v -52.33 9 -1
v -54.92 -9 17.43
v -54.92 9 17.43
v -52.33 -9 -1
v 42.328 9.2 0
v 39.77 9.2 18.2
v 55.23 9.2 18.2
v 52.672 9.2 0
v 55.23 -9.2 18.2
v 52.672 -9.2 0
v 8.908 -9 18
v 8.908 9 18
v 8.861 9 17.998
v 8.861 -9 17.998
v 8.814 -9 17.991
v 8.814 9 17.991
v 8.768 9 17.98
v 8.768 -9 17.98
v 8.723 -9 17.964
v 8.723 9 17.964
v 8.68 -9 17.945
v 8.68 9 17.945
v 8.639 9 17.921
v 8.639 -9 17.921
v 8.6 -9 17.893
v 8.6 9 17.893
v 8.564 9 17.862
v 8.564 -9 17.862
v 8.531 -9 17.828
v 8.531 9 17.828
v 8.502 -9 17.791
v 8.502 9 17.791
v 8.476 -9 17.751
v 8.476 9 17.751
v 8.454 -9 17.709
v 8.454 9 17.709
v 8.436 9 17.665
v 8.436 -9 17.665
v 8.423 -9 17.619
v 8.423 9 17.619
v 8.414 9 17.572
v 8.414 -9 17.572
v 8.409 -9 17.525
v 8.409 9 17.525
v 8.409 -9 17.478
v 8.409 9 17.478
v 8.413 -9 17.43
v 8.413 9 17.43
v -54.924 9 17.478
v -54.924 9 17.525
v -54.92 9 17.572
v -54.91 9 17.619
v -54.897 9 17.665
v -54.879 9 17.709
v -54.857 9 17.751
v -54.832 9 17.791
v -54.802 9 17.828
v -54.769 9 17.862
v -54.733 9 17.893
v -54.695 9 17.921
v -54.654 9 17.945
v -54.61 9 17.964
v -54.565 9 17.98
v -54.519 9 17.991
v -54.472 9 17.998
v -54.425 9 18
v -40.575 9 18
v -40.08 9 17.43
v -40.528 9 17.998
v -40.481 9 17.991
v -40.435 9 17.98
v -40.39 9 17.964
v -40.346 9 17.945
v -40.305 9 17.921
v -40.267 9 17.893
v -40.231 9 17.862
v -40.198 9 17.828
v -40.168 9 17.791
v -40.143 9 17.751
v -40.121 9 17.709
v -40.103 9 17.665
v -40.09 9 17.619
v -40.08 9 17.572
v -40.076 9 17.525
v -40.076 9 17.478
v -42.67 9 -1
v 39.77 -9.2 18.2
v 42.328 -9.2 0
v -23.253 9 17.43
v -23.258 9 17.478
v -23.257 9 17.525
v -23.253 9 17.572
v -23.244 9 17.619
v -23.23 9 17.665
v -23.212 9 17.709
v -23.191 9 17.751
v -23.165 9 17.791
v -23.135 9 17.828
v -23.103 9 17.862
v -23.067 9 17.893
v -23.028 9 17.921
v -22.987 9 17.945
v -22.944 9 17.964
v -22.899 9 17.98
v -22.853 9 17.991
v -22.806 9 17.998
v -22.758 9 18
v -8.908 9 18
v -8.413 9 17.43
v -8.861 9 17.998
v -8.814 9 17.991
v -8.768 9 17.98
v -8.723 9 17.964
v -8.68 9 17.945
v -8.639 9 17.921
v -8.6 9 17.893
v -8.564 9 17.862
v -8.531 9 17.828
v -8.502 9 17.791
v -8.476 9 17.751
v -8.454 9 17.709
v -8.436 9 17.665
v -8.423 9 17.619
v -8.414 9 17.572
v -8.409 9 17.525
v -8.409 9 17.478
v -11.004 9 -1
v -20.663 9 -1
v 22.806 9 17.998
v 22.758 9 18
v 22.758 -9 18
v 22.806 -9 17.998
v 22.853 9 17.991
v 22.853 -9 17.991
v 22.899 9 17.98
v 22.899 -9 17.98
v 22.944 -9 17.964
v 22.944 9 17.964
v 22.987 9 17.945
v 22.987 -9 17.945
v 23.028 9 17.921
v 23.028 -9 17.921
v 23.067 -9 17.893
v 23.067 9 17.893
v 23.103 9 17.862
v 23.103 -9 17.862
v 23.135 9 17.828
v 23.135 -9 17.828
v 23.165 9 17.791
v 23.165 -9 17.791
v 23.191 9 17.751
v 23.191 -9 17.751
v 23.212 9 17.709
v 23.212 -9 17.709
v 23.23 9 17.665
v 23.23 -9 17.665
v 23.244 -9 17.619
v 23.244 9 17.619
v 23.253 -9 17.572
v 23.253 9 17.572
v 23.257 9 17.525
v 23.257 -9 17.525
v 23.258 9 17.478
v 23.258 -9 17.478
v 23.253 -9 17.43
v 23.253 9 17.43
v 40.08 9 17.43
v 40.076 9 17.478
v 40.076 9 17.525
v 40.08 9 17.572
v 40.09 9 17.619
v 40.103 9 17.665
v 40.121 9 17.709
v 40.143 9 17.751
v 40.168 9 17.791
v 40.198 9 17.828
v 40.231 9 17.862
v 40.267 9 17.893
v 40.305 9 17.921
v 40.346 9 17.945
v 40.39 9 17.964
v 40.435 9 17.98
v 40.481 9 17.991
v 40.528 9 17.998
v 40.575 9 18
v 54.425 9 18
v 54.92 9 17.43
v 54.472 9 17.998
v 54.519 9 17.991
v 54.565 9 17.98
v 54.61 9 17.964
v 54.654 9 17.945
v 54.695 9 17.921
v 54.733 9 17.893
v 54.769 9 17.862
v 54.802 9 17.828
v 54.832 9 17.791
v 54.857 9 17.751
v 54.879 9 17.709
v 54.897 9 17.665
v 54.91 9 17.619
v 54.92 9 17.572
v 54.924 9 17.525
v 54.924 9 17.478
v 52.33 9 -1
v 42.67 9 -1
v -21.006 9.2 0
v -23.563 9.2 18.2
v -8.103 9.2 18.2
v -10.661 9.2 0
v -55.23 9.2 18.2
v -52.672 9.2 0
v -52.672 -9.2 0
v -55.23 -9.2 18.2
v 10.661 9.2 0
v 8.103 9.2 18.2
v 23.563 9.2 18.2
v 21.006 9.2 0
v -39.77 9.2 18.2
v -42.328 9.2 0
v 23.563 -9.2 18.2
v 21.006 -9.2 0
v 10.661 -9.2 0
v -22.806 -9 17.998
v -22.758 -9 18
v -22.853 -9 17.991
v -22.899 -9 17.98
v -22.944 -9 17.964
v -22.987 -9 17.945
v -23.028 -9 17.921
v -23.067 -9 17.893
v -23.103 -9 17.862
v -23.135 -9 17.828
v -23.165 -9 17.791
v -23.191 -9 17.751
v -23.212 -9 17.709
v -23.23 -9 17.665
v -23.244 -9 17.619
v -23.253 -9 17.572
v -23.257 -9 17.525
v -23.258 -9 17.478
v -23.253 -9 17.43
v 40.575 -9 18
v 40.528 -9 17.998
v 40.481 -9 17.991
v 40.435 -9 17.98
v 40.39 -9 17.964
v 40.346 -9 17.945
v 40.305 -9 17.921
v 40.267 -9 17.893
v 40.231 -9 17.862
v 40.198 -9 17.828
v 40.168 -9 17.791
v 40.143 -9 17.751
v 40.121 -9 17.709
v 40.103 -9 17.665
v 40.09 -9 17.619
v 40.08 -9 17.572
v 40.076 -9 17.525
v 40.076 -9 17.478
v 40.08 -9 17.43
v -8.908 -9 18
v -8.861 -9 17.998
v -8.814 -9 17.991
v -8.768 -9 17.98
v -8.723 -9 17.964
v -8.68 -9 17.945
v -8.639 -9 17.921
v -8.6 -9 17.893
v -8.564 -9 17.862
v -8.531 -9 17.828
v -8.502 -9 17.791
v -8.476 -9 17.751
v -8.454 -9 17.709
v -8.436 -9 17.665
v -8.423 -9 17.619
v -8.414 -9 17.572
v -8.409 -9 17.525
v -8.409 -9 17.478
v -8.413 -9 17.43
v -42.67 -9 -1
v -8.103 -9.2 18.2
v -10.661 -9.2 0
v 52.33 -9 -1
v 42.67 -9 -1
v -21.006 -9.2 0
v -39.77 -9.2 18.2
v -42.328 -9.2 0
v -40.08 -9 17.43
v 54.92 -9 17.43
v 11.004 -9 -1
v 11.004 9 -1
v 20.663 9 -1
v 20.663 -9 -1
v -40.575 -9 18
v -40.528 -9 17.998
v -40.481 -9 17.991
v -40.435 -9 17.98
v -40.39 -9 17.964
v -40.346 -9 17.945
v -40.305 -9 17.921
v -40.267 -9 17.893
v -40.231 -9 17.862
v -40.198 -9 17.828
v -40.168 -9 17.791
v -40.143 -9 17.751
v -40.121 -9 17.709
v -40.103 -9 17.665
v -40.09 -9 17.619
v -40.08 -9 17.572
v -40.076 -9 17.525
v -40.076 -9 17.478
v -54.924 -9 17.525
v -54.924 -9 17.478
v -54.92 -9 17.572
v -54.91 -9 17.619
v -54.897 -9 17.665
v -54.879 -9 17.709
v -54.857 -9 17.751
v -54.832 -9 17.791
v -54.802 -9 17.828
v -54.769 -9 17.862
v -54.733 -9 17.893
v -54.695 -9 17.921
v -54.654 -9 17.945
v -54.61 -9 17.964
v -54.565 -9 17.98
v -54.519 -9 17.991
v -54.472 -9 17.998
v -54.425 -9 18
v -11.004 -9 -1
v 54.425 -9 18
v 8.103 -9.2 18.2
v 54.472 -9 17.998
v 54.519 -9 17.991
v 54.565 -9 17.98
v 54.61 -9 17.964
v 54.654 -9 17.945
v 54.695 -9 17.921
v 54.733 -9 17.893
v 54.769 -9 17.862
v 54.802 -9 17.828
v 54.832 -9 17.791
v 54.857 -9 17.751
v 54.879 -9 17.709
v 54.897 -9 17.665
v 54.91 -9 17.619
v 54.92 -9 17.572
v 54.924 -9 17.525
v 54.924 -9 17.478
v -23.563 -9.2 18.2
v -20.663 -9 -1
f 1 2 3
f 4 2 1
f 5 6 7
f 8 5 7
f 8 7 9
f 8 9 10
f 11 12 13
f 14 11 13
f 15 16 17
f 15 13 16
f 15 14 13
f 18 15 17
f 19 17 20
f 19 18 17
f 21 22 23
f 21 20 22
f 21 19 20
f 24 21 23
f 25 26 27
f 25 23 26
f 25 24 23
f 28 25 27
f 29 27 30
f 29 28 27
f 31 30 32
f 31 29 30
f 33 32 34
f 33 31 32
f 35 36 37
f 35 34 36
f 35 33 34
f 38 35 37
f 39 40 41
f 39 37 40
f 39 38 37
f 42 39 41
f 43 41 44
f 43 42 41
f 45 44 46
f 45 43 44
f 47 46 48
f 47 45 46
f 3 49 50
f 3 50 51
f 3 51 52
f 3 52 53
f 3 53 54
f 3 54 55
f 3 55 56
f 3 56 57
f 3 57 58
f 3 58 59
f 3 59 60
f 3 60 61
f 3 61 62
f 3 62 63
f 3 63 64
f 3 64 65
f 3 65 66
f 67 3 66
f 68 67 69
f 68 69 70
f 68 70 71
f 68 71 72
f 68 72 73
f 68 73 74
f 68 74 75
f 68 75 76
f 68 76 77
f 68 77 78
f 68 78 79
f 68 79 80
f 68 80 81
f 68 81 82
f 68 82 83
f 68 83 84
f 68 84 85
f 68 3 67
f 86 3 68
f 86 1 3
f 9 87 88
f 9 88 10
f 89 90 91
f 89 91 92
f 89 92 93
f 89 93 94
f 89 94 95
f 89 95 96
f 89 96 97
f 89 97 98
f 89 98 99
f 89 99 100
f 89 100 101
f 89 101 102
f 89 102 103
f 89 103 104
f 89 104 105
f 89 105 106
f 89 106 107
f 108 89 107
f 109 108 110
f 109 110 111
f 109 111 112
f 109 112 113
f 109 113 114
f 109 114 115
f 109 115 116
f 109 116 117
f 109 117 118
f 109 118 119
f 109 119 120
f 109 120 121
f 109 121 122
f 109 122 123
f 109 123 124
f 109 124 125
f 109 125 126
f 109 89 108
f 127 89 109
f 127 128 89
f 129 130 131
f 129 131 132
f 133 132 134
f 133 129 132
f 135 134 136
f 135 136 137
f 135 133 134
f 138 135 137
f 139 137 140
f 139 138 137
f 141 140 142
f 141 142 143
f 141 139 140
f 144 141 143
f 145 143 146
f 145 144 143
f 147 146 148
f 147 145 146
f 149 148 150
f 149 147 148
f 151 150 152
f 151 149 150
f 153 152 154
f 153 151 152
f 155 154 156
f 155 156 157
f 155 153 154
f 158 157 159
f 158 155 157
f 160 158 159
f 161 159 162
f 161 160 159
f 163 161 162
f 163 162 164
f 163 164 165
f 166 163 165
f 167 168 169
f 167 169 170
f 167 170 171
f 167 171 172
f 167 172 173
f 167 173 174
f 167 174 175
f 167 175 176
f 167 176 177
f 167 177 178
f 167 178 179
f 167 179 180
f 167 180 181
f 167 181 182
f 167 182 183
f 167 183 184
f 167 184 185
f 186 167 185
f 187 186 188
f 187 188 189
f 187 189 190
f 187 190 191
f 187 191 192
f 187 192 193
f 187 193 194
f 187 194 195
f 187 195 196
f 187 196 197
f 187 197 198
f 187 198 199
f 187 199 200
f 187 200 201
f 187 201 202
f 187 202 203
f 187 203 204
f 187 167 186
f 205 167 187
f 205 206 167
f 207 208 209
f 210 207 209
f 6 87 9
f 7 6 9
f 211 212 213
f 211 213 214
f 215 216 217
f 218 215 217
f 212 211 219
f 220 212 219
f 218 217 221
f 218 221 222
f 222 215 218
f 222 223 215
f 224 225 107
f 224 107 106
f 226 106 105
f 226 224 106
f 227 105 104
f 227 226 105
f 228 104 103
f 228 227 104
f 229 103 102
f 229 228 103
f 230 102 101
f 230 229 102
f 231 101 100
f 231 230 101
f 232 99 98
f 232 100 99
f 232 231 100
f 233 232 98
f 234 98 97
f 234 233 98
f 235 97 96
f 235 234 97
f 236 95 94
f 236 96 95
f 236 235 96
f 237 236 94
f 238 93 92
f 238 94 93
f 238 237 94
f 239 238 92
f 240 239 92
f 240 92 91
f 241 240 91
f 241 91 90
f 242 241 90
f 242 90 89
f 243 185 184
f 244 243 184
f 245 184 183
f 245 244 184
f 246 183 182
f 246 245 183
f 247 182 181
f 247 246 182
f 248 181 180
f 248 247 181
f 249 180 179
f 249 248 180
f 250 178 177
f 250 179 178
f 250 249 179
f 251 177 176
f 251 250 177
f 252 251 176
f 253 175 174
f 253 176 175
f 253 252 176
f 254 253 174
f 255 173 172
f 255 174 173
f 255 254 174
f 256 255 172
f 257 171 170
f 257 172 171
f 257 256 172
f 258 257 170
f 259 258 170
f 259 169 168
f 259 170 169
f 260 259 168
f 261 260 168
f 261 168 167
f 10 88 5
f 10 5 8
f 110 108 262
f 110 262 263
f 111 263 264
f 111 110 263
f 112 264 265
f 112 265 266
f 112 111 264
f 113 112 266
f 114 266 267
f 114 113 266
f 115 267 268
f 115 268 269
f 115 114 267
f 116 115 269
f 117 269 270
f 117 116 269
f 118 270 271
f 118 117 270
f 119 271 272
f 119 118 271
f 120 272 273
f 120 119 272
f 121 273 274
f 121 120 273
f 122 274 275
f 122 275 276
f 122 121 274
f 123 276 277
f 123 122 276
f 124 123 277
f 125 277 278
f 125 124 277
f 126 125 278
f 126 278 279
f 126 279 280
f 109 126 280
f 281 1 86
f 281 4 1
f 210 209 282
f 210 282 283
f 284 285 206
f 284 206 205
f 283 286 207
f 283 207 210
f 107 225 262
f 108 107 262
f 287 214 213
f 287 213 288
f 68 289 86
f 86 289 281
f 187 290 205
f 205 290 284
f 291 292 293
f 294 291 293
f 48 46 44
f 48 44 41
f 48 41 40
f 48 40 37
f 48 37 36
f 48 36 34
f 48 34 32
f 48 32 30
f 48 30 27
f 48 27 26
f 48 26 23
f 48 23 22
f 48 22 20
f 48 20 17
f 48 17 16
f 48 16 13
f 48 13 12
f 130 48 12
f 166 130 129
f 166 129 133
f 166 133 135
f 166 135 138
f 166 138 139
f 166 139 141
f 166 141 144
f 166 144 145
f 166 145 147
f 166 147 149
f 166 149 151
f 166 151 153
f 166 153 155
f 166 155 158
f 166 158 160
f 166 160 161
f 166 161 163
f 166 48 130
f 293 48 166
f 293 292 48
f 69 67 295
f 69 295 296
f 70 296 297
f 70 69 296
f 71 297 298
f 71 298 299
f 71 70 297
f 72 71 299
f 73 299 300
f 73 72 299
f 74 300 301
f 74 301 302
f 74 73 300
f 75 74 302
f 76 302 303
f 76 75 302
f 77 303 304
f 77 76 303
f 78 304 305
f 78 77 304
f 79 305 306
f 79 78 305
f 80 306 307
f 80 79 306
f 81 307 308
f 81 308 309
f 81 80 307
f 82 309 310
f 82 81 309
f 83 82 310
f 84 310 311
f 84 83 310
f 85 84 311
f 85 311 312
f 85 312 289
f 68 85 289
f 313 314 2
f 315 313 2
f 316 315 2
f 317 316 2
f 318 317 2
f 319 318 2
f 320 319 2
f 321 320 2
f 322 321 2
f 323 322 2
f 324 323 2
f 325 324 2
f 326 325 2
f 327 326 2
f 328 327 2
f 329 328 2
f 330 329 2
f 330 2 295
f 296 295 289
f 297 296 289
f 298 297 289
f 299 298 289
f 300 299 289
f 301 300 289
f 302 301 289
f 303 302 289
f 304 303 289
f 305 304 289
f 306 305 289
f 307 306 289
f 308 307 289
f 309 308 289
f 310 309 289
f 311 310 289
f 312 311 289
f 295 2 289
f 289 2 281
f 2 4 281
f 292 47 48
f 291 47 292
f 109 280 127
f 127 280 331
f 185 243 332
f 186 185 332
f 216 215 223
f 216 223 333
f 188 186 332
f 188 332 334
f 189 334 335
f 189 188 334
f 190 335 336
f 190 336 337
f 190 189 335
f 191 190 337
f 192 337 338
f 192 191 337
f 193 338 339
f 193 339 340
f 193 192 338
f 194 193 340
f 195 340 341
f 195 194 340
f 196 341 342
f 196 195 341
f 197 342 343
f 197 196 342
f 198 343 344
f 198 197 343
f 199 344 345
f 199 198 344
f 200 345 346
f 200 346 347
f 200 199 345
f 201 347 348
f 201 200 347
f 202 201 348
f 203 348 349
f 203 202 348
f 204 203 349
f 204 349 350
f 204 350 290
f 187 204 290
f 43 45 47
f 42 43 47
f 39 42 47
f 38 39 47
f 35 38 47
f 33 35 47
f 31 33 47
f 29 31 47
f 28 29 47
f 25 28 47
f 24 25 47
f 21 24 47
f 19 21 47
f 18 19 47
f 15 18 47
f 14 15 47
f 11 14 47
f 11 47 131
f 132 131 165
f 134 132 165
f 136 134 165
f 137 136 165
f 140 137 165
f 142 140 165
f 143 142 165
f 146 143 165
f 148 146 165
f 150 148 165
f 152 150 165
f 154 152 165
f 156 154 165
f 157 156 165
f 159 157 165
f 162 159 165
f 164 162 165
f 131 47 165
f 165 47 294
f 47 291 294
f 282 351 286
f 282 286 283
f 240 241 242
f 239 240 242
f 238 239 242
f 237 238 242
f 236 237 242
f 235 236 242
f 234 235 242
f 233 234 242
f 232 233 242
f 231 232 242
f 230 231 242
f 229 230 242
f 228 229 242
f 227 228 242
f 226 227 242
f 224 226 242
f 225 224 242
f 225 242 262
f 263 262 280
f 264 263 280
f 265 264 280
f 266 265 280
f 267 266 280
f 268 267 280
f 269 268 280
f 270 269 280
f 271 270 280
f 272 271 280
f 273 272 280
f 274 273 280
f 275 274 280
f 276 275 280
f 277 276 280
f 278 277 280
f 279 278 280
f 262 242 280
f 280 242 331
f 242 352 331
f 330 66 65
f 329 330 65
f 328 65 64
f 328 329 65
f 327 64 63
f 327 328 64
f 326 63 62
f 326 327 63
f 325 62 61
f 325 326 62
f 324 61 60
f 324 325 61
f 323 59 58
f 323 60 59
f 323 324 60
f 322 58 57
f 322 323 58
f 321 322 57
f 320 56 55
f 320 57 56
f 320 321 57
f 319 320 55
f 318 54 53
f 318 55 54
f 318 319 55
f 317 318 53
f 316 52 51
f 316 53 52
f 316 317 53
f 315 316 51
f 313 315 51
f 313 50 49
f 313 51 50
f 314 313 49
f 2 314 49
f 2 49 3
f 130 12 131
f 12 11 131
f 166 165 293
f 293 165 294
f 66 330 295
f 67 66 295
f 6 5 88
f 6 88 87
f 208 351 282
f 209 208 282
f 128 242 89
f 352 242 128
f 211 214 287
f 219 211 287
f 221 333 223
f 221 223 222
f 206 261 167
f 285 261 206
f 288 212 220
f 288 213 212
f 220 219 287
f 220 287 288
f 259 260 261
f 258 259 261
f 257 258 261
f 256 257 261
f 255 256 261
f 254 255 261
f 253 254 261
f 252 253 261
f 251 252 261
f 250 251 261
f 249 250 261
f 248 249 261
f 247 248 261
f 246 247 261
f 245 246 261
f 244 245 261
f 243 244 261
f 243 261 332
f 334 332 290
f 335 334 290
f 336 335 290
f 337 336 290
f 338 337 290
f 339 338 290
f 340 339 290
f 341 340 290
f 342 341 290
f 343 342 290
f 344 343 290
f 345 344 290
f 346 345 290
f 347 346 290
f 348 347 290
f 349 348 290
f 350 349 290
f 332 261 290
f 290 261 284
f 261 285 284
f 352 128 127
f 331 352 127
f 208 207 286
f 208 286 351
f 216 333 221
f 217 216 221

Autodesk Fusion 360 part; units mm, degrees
sketch "Contact Patch" plane through (0, 0, 0) normal (0, 0, 1) x (1, 0, 0)
  line L0 (75, -9) -> (-75, -9)
  line L1 (-75, -9) -> (-75, 9)
  line L2 (-75, 9) -> (75, 9)
  line L3 (75, 9) -> (75, -9)
  line L4 (75, -9) -> (-75, 9) construction
  line L5 (-75, -9) -> (75, 9) construction
  dimension "d3" = 150
  dimension "d4" = 18
sketch "Sketch1" plane through (0, 0, 0) normal (0, 1, 0) x (1, 0, 0) in component "Joint"
  line L0 (-55, -18) -> (-40, -18)
  line L1 (-40, -18) -> (-42.5297, 0)
  line L2 (-55, -18) -> (-52.4703, 0)
  line L3 (-75, 0) -> (75, 0)
  line L4 (-75, 0) -> (-75, -13) construction
  line L5 (-52.4703, 0) -> (-42.5297, 0)
  point P0 (-75, 0)
  dimension "d13" = 20
  dimension "d14" = 18
  dimension "d15" = 15
  dimension "d16" = 8
extrude "Extrude1" add sketch "Sketch1" along normal blind 8.9999 and the other way blind 8.9999 makes body 1 in component "Joint"
move_face "OffsetFaces1" offset 1 1 faces at (-49.1568, -3, 0) on bodies 1 in component "Joint"
sketch "Sketch2" plane through (0, 0, 0) normal (0, 1, 0) x (1, 0, 0) in component "Joint"
  line L0 (-55, -18) -> (-40, -18)
  line L1 (-40, -18) -> (-42.6703, 1)
  line L2 (-42.6703, 1) -> (-52.3297, 1)
  line L3 (-52.3297, 1) -> (-55, -18)
  line L4 (-75, 0) -> (75, 0)
  line L5 (-52.4703, 0) -> (-42.5297, 0)
  line L6 (-52.5278, 1.0278) -> (-55.2301, -18.2)
  line L7 (-55.2301, -18.2) -> (-39.7699, -18.2)
  line L8 (-39.7699, -18.2) -> (-42.4722, 1.0278)
  line L9 (-52.6722, 0) -> (-42.3278, 0)
  dimension "d27" = 0.2
extrude "Extrude2" add sketch "Sketch2" along normal blind 9.1999 and the other way blind 9.1999 separate body contours L0 L1 L3 L4 L5 L9 | L0 L1 L3 L4 L6 L7 L8 L9 makes body 2 in component "Joint"
fillet "Fillet1" radius 0.5 2 edges at (-55, 0, 18) (-40, 0, 18) on bodies 1 in component "Joint"
pattern_linear "00000000-0000-0000-0000-000000000000" [suppressed]
component "Joint" placed x (1, 0, 0) y (0, 1, 0) z (0, 0, 1) at (0, 0, 0)
component "Joint" placed x (1, 0, 0) y (0, 1, 0) z (0, 0, 1) at (31.6667, 0, 0)
component "Joint" placed x (1, 0, 0) y (0, 1, 0) z (0, 0, 1) at (63.3333, 0, 0)
component "Joint" placed x (1, 0, 0) y (0, 1, 0) z (0, 0, 1) at (95, 0, 0)
equation "Length = 150 mm"
equation "Width = 18 mm"
equation "d3 = Length"
equation "d4 = Width"
equation "UserOffset1 = 20 mm"
equation "UserOffset2 = 20 mm"
equation "Offset1 = if(UserOffset1 < 1 mm; 5 mm; UserOffset1)"
equation "Offset2 = if(UserOffset1 < 1 mm; 5 mm; UserOffset2)"
equation "Nestled_Board_Thickness = 18 mm"
equation "Dovetail_H = Nestled_Board_Thickness"
equation "Dovetail_L = 15 mm"
equation "Dovetail_Angle = 8 deg"
equation "d13 = Offset1"
equation "d14 = Dovetail_H"
equation "d15 = Dovetail_L"
equation "d16 = Dovetail_Angle"
equation "Side_Offset1 = 0.0001 mm"
equation "Side_Offset2 = 0.0001 mm"
equation "Tenon_Width1 = ( Width / 2 ) - Side_Offset1"
equation "Tenon_Width2 = ( Width / 2 ) - Side_Offset2"
equation "d21 = Tenon_Width1"
equation "d23 = Tenon_Width2"
equation "Clearance = 0.2 mm"
equation "d27 = Clearance"
equation "d28 = Tenon_Width1 + Clearance"
equation "d30 = Tenon_Width2 + Clearance"
equation "Dovetail_QTY = 4"
equation "SpacingLength = Length - Offset1 - Offset2 - Dovetail_L"
equation "Radius = 0.5 mm"
equation "d36 = Radius"
equation "d37 = Dovetail_QTY"
equation "d39 = SpacingLength"
